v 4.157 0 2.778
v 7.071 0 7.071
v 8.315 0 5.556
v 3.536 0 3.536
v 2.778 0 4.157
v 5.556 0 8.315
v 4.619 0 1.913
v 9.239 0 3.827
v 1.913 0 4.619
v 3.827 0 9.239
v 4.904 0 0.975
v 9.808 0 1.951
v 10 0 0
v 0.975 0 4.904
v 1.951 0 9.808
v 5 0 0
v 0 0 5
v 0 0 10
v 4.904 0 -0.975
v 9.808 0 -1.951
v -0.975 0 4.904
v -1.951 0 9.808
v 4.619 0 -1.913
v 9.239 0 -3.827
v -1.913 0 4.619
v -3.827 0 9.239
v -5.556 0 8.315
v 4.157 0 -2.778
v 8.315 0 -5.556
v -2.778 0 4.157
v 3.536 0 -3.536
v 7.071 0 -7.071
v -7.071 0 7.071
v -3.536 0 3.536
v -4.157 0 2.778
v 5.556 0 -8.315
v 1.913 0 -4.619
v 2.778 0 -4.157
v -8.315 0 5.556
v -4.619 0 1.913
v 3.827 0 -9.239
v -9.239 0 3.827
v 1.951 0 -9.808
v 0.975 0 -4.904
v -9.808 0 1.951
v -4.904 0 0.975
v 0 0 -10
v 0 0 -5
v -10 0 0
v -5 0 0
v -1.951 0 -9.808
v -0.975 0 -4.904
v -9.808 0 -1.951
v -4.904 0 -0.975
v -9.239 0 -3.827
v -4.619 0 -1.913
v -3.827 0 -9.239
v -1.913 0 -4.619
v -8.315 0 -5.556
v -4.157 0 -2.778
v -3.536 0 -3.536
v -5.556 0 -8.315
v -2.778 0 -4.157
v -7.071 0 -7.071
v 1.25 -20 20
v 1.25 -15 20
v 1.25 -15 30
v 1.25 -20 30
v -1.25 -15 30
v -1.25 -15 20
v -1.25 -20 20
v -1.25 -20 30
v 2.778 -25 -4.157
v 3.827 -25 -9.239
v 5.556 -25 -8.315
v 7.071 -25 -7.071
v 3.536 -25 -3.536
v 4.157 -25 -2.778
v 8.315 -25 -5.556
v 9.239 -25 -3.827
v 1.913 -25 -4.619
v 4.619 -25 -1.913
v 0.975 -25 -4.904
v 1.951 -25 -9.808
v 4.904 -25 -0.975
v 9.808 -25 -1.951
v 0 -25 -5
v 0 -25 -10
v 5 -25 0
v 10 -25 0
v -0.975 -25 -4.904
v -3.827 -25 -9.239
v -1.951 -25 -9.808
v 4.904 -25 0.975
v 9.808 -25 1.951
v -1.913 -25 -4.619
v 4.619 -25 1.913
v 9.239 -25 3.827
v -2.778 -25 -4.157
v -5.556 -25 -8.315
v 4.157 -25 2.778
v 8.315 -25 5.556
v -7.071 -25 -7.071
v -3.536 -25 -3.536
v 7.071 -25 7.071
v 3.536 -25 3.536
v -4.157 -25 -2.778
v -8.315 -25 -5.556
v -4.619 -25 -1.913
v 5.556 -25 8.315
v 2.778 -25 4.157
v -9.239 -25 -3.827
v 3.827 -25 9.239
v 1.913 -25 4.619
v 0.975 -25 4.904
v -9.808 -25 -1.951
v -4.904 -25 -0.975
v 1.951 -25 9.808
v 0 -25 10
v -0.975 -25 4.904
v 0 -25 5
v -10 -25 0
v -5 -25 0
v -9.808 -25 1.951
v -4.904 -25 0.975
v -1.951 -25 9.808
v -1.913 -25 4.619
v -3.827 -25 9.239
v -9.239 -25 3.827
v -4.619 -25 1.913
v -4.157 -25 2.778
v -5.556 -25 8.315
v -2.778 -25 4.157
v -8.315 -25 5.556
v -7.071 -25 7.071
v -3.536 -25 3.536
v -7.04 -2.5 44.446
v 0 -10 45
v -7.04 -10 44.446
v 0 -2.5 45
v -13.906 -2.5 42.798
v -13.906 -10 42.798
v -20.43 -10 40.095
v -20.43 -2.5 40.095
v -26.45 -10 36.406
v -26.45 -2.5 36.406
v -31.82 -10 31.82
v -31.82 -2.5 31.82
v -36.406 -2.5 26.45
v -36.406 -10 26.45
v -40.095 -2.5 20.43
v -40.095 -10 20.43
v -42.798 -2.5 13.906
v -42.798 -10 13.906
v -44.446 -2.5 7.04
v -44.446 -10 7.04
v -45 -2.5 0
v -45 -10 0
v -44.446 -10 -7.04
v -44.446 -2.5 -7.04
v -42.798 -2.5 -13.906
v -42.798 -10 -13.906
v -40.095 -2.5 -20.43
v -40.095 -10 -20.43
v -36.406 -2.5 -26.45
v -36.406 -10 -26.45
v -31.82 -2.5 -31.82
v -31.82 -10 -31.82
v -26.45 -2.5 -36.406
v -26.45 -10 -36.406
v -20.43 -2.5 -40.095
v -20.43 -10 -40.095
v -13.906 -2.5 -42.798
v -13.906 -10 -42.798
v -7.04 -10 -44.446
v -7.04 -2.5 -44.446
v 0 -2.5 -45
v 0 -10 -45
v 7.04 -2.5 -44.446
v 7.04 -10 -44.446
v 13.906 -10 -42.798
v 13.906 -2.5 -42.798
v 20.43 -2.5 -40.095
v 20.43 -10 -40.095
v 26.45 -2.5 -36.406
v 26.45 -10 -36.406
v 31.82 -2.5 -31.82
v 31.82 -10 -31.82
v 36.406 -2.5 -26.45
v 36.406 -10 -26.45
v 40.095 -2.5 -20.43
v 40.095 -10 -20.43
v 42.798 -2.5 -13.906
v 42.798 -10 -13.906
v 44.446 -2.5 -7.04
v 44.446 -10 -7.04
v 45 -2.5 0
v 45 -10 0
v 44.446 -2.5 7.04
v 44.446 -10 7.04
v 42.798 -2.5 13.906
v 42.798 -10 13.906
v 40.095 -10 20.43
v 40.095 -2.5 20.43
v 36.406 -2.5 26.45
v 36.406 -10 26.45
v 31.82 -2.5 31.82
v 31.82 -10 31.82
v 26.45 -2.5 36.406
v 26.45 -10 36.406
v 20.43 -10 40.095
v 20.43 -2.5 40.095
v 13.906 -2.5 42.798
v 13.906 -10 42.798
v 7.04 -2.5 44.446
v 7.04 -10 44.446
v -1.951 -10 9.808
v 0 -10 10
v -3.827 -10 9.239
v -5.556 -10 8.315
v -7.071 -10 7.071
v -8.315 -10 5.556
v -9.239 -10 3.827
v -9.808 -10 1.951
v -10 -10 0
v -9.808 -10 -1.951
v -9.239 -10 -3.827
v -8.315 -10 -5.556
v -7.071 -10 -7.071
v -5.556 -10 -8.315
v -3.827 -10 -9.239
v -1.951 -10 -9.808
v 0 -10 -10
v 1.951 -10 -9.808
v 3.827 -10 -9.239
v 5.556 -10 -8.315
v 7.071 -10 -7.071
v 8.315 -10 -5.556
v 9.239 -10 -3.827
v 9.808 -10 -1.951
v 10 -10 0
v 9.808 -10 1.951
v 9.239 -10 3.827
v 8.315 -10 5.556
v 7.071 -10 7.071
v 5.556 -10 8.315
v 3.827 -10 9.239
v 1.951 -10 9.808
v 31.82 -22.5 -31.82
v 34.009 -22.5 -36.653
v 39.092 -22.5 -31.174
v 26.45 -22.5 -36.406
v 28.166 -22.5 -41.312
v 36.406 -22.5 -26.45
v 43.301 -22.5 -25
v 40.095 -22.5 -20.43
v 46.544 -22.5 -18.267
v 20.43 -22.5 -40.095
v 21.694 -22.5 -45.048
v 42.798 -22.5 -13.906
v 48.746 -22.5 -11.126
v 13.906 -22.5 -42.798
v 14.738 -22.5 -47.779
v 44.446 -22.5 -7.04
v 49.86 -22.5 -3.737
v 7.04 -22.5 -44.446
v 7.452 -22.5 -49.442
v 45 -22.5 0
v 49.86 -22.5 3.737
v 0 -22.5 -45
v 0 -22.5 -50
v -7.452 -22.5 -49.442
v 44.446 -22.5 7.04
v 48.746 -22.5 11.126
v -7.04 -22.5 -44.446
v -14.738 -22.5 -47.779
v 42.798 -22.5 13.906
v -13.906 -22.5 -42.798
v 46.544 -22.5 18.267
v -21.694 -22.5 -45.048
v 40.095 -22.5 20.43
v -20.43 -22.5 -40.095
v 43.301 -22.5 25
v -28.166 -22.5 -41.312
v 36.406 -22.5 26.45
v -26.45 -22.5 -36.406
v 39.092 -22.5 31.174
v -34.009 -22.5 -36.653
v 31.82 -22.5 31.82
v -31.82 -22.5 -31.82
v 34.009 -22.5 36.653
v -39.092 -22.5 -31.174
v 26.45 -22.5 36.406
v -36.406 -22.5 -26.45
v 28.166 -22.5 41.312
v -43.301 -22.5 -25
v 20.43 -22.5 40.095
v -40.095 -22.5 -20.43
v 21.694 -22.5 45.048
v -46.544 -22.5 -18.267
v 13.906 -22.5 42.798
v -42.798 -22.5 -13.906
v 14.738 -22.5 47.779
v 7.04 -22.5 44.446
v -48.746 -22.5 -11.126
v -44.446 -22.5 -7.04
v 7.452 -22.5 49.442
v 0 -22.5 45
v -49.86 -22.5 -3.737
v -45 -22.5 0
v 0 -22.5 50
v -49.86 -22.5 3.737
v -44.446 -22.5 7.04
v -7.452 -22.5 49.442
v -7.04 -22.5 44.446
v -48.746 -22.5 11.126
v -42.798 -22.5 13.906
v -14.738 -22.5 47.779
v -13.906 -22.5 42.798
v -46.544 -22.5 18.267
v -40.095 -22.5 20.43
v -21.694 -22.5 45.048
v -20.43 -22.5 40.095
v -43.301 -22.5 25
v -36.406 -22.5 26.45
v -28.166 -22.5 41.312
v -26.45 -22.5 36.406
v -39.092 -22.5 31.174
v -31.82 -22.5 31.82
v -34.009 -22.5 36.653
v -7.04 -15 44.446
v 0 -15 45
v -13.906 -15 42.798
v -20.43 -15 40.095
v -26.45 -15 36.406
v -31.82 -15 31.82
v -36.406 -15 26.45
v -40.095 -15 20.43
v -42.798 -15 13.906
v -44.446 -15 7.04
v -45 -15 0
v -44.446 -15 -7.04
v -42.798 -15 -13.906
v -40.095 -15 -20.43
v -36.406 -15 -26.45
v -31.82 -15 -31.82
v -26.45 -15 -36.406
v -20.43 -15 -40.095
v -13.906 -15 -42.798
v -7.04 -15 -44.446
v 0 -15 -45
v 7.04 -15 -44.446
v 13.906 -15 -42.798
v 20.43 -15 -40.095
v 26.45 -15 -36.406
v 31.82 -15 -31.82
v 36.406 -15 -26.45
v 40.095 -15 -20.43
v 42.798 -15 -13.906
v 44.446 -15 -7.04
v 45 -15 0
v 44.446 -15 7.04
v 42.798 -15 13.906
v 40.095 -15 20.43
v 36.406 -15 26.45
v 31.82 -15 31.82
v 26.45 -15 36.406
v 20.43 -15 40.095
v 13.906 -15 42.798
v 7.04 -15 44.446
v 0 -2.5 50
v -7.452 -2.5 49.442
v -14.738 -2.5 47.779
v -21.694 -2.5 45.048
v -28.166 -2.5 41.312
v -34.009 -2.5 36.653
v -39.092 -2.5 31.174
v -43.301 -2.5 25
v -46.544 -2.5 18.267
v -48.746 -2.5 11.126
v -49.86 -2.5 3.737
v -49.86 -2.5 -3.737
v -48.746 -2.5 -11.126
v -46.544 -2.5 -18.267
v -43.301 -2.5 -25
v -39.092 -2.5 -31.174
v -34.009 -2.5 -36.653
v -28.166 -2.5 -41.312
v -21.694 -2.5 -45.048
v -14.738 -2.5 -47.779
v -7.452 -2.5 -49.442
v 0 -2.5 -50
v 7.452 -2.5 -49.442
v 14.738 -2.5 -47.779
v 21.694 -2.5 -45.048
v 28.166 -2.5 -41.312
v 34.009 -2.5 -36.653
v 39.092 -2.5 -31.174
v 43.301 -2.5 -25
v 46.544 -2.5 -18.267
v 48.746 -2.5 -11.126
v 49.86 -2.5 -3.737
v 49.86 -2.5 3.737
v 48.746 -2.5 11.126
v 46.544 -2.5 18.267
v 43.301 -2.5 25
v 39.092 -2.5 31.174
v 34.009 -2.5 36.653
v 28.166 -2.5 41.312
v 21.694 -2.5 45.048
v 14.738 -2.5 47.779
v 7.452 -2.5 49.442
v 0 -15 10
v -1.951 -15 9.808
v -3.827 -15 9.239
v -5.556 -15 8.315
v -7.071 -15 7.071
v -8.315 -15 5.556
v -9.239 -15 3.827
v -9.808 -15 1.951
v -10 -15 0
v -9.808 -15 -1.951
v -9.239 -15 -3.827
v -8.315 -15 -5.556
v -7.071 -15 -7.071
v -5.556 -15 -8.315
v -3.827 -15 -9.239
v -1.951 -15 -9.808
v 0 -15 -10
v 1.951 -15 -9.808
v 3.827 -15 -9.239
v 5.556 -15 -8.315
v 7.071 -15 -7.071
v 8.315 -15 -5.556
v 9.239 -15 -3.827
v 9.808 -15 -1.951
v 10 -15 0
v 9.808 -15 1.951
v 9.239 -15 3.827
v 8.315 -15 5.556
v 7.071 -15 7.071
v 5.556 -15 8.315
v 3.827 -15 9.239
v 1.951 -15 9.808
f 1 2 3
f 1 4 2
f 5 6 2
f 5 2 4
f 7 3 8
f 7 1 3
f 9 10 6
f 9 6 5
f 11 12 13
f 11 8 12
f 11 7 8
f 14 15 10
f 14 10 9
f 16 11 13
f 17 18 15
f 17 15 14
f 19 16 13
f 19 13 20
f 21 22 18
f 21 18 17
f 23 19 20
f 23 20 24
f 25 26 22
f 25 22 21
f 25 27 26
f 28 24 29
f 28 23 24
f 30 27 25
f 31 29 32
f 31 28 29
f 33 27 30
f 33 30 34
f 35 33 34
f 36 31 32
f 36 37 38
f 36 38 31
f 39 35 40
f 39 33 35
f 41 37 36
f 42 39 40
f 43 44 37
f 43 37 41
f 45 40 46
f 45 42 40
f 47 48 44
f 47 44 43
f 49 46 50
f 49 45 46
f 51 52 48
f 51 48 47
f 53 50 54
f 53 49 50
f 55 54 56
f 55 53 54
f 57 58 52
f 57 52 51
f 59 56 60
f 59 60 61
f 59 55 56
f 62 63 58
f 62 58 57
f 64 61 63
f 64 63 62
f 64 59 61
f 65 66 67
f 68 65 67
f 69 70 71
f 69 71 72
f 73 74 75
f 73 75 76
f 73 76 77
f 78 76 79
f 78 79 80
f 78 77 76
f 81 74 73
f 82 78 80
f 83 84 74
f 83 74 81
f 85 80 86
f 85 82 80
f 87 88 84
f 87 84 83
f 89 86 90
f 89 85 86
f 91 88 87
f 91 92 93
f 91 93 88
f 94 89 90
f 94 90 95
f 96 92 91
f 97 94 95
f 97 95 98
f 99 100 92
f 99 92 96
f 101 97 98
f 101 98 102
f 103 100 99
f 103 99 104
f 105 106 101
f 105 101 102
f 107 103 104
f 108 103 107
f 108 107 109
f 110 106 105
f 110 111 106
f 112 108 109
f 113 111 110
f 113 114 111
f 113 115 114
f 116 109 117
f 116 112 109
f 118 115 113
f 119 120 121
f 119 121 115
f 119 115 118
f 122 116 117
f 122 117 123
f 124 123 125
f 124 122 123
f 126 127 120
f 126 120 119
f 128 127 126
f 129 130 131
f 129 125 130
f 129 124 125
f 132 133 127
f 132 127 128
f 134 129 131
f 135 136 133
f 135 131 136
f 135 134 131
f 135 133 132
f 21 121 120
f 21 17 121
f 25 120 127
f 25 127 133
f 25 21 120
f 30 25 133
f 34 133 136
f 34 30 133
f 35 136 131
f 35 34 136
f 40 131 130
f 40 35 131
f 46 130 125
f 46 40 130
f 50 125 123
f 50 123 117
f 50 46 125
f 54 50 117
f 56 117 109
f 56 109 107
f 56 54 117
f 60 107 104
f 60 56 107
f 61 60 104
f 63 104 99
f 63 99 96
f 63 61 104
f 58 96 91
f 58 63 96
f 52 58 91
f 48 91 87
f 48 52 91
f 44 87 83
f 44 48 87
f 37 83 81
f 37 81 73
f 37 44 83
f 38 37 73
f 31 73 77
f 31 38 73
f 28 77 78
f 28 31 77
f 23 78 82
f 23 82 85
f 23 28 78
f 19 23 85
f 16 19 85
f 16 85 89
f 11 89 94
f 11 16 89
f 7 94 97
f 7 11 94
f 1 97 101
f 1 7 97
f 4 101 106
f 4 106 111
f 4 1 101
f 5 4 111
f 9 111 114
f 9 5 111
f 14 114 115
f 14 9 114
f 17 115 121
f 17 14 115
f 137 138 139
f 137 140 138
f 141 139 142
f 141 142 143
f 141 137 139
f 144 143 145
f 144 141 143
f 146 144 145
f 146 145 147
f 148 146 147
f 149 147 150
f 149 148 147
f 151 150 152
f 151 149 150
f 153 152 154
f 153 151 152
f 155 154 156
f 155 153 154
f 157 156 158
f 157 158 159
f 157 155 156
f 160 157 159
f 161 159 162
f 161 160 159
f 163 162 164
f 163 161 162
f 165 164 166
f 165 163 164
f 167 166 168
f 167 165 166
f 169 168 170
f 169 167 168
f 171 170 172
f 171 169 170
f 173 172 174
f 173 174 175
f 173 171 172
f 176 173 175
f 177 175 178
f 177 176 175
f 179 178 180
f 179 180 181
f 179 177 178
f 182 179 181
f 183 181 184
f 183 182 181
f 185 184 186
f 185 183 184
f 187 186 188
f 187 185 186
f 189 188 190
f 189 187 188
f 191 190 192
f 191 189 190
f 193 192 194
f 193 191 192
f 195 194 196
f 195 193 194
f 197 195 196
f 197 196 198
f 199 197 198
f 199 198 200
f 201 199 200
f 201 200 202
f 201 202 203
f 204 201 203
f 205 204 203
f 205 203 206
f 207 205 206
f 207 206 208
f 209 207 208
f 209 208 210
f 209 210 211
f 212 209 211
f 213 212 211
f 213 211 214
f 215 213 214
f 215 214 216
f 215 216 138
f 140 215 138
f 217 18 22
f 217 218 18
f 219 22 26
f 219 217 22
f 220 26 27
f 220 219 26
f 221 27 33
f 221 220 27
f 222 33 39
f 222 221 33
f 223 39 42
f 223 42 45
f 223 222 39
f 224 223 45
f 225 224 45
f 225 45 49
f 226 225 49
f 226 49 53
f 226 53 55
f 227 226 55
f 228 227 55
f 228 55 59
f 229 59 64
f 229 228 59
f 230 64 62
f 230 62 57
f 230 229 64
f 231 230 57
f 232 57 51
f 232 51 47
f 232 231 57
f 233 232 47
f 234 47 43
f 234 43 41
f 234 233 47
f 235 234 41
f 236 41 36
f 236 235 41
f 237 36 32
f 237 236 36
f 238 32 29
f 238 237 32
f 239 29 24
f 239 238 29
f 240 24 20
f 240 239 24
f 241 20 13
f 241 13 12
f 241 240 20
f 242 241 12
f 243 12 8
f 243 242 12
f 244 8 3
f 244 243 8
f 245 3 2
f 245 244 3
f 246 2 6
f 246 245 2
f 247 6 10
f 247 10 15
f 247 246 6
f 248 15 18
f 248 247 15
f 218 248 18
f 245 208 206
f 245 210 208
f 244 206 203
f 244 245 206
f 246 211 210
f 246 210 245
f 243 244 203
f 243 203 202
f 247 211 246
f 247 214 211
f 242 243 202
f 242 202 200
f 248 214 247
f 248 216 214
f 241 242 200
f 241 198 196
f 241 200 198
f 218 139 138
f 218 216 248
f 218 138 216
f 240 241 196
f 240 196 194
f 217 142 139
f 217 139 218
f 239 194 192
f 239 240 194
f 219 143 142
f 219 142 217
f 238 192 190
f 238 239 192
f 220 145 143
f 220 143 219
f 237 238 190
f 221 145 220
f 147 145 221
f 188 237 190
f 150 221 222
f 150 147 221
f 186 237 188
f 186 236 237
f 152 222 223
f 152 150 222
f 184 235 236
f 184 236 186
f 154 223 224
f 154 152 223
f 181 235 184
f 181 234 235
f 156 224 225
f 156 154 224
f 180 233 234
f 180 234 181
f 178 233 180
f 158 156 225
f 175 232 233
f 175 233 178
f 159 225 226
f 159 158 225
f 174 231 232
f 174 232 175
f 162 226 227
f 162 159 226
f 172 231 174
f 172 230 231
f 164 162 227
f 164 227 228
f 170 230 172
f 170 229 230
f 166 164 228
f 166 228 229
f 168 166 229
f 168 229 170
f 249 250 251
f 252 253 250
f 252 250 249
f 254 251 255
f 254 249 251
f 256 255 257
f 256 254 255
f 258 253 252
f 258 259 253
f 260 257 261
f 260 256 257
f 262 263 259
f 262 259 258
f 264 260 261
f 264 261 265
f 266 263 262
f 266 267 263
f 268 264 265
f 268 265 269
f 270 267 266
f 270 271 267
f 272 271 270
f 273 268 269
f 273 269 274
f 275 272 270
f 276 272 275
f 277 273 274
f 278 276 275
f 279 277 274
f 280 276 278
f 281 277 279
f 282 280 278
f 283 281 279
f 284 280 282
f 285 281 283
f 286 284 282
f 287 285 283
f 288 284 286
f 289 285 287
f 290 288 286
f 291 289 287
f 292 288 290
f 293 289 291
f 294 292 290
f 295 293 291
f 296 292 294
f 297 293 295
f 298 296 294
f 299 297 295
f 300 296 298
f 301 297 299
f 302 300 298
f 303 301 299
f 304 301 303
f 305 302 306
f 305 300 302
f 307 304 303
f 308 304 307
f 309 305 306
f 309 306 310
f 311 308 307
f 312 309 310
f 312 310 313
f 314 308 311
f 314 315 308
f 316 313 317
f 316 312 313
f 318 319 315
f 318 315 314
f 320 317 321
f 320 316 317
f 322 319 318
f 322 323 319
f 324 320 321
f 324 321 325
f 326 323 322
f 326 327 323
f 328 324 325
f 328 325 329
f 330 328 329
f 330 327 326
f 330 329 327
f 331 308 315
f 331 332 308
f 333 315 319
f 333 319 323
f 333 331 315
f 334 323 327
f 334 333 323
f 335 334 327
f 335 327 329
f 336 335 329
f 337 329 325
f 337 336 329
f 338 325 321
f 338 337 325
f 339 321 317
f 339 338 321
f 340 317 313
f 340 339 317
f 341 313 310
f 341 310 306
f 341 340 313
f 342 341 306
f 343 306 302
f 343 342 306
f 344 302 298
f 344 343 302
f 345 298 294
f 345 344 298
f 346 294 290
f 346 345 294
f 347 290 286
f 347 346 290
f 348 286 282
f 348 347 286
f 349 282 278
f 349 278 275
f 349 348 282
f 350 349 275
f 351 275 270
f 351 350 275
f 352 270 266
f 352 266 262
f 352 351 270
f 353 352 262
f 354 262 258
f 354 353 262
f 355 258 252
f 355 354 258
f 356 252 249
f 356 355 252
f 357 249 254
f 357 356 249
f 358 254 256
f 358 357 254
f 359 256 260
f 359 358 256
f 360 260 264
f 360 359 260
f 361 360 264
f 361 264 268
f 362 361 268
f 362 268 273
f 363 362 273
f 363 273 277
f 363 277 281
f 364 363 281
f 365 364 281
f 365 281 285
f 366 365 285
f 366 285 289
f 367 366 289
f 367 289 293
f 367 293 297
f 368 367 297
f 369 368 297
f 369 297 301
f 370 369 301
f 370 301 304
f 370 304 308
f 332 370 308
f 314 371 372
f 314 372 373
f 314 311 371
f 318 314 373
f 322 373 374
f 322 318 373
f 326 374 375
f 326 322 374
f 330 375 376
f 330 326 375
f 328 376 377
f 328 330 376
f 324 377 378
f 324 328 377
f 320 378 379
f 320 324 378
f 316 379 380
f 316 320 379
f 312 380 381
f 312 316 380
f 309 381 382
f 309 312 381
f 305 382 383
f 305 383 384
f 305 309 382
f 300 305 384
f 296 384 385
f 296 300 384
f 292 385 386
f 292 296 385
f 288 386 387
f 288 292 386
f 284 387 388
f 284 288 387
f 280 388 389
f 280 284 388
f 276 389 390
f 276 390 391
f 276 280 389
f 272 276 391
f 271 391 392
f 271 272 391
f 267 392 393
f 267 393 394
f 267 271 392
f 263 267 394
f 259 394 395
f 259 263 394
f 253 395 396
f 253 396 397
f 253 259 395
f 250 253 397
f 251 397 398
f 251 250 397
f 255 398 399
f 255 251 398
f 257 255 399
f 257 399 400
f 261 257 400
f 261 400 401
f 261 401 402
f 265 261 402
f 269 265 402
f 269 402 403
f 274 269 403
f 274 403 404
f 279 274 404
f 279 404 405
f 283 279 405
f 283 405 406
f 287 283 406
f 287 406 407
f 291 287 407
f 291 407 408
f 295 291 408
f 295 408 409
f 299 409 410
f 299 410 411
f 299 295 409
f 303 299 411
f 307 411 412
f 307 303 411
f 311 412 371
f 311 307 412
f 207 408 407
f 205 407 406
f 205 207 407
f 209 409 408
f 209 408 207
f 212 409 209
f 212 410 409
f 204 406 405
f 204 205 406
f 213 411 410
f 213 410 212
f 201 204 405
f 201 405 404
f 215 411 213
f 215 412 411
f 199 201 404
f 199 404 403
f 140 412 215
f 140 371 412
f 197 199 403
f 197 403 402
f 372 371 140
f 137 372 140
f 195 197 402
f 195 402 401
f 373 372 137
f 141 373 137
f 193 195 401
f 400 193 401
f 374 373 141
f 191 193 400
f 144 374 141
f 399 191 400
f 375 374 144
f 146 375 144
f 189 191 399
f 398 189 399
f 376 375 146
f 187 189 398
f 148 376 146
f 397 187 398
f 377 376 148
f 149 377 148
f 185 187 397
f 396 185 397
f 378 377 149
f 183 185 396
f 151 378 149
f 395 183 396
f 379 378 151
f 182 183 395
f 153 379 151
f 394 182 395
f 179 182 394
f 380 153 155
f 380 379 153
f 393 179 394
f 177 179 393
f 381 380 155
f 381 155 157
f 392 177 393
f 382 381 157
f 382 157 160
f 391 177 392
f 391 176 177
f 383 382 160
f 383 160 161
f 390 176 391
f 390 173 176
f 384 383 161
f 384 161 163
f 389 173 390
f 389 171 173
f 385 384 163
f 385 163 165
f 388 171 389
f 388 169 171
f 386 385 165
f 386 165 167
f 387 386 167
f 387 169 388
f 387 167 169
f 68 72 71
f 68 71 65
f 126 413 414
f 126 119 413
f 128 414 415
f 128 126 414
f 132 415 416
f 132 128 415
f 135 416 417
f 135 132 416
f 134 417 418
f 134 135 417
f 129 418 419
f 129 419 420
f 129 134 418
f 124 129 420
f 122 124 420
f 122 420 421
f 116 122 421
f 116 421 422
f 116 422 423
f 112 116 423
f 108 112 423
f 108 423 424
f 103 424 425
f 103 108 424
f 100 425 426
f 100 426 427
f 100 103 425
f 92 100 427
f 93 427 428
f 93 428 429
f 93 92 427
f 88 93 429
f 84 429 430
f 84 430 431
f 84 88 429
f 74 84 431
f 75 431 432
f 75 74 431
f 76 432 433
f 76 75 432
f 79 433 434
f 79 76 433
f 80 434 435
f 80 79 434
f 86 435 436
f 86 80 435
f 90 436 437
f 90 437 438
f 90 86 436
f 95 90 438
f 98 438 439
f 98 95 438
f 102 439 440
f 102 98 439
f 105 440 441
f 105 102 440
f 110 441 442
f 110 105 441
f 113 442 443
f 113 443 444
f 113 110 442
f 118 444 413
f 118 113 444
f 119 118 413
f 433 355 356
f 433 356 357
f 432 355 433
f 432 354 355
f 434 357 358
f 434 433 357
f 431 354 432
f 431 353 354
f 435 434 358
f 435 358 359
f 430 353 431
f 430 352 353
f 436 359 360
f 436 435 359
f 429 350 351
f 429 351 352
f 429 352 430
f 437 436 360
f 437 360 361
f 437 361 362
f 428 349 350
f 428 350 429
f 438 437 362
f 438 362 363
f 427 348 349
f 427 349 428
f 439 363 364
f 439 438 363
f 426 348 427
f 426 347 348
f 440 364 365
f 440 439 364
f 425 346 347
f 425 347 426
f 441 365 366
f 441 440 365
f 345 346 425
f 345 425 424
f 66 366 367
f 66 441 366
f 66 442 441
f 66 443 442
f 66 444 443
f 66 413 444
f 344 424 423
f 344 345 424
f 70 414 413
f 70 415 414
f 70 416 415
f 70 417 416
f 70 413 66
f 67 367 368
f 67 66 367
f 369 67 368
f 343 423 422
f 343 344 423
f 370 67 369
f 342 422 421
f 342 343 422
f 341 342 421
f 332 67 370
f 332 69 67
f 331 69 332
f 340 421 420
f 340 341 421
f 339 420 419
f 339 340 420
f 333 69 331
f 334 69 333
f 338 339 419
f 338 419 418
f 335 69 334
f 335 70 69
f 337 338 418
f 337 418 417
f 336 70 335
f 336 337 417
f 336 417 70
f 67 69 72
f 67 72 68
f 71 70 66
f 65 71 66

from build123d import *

# Parameters (mm, degrees)
F3_W     = 2.5
F3_H     = 10
F4_DEPTH = 5


with BuildPart() as f2:
    # F0 (on Right) → F2 (revolve)
    with BuildSketch(Plane.YZ):
        Polygon((-25, 5), (0, 5), (0, 10), (-10, 10), (-10, 45), (-2.5, 45), (-2.5, 50), (-22.5, 50), (-22.5, 45), (-15, 45), (-15, 10), (-25, 10), align=None)
    revolve(axis=Axis((0, -23.925491, 0), (0, -1, 0)))

    # F3 (on face) → F4 (join)
    with BuildSketch(Plane.XZ.offset(15)):
        with Locations((0, 25)):
            Rectangle(F3_W, F3_H)
    extrude(amount=F4_DEPTH)


solid = f2.part
